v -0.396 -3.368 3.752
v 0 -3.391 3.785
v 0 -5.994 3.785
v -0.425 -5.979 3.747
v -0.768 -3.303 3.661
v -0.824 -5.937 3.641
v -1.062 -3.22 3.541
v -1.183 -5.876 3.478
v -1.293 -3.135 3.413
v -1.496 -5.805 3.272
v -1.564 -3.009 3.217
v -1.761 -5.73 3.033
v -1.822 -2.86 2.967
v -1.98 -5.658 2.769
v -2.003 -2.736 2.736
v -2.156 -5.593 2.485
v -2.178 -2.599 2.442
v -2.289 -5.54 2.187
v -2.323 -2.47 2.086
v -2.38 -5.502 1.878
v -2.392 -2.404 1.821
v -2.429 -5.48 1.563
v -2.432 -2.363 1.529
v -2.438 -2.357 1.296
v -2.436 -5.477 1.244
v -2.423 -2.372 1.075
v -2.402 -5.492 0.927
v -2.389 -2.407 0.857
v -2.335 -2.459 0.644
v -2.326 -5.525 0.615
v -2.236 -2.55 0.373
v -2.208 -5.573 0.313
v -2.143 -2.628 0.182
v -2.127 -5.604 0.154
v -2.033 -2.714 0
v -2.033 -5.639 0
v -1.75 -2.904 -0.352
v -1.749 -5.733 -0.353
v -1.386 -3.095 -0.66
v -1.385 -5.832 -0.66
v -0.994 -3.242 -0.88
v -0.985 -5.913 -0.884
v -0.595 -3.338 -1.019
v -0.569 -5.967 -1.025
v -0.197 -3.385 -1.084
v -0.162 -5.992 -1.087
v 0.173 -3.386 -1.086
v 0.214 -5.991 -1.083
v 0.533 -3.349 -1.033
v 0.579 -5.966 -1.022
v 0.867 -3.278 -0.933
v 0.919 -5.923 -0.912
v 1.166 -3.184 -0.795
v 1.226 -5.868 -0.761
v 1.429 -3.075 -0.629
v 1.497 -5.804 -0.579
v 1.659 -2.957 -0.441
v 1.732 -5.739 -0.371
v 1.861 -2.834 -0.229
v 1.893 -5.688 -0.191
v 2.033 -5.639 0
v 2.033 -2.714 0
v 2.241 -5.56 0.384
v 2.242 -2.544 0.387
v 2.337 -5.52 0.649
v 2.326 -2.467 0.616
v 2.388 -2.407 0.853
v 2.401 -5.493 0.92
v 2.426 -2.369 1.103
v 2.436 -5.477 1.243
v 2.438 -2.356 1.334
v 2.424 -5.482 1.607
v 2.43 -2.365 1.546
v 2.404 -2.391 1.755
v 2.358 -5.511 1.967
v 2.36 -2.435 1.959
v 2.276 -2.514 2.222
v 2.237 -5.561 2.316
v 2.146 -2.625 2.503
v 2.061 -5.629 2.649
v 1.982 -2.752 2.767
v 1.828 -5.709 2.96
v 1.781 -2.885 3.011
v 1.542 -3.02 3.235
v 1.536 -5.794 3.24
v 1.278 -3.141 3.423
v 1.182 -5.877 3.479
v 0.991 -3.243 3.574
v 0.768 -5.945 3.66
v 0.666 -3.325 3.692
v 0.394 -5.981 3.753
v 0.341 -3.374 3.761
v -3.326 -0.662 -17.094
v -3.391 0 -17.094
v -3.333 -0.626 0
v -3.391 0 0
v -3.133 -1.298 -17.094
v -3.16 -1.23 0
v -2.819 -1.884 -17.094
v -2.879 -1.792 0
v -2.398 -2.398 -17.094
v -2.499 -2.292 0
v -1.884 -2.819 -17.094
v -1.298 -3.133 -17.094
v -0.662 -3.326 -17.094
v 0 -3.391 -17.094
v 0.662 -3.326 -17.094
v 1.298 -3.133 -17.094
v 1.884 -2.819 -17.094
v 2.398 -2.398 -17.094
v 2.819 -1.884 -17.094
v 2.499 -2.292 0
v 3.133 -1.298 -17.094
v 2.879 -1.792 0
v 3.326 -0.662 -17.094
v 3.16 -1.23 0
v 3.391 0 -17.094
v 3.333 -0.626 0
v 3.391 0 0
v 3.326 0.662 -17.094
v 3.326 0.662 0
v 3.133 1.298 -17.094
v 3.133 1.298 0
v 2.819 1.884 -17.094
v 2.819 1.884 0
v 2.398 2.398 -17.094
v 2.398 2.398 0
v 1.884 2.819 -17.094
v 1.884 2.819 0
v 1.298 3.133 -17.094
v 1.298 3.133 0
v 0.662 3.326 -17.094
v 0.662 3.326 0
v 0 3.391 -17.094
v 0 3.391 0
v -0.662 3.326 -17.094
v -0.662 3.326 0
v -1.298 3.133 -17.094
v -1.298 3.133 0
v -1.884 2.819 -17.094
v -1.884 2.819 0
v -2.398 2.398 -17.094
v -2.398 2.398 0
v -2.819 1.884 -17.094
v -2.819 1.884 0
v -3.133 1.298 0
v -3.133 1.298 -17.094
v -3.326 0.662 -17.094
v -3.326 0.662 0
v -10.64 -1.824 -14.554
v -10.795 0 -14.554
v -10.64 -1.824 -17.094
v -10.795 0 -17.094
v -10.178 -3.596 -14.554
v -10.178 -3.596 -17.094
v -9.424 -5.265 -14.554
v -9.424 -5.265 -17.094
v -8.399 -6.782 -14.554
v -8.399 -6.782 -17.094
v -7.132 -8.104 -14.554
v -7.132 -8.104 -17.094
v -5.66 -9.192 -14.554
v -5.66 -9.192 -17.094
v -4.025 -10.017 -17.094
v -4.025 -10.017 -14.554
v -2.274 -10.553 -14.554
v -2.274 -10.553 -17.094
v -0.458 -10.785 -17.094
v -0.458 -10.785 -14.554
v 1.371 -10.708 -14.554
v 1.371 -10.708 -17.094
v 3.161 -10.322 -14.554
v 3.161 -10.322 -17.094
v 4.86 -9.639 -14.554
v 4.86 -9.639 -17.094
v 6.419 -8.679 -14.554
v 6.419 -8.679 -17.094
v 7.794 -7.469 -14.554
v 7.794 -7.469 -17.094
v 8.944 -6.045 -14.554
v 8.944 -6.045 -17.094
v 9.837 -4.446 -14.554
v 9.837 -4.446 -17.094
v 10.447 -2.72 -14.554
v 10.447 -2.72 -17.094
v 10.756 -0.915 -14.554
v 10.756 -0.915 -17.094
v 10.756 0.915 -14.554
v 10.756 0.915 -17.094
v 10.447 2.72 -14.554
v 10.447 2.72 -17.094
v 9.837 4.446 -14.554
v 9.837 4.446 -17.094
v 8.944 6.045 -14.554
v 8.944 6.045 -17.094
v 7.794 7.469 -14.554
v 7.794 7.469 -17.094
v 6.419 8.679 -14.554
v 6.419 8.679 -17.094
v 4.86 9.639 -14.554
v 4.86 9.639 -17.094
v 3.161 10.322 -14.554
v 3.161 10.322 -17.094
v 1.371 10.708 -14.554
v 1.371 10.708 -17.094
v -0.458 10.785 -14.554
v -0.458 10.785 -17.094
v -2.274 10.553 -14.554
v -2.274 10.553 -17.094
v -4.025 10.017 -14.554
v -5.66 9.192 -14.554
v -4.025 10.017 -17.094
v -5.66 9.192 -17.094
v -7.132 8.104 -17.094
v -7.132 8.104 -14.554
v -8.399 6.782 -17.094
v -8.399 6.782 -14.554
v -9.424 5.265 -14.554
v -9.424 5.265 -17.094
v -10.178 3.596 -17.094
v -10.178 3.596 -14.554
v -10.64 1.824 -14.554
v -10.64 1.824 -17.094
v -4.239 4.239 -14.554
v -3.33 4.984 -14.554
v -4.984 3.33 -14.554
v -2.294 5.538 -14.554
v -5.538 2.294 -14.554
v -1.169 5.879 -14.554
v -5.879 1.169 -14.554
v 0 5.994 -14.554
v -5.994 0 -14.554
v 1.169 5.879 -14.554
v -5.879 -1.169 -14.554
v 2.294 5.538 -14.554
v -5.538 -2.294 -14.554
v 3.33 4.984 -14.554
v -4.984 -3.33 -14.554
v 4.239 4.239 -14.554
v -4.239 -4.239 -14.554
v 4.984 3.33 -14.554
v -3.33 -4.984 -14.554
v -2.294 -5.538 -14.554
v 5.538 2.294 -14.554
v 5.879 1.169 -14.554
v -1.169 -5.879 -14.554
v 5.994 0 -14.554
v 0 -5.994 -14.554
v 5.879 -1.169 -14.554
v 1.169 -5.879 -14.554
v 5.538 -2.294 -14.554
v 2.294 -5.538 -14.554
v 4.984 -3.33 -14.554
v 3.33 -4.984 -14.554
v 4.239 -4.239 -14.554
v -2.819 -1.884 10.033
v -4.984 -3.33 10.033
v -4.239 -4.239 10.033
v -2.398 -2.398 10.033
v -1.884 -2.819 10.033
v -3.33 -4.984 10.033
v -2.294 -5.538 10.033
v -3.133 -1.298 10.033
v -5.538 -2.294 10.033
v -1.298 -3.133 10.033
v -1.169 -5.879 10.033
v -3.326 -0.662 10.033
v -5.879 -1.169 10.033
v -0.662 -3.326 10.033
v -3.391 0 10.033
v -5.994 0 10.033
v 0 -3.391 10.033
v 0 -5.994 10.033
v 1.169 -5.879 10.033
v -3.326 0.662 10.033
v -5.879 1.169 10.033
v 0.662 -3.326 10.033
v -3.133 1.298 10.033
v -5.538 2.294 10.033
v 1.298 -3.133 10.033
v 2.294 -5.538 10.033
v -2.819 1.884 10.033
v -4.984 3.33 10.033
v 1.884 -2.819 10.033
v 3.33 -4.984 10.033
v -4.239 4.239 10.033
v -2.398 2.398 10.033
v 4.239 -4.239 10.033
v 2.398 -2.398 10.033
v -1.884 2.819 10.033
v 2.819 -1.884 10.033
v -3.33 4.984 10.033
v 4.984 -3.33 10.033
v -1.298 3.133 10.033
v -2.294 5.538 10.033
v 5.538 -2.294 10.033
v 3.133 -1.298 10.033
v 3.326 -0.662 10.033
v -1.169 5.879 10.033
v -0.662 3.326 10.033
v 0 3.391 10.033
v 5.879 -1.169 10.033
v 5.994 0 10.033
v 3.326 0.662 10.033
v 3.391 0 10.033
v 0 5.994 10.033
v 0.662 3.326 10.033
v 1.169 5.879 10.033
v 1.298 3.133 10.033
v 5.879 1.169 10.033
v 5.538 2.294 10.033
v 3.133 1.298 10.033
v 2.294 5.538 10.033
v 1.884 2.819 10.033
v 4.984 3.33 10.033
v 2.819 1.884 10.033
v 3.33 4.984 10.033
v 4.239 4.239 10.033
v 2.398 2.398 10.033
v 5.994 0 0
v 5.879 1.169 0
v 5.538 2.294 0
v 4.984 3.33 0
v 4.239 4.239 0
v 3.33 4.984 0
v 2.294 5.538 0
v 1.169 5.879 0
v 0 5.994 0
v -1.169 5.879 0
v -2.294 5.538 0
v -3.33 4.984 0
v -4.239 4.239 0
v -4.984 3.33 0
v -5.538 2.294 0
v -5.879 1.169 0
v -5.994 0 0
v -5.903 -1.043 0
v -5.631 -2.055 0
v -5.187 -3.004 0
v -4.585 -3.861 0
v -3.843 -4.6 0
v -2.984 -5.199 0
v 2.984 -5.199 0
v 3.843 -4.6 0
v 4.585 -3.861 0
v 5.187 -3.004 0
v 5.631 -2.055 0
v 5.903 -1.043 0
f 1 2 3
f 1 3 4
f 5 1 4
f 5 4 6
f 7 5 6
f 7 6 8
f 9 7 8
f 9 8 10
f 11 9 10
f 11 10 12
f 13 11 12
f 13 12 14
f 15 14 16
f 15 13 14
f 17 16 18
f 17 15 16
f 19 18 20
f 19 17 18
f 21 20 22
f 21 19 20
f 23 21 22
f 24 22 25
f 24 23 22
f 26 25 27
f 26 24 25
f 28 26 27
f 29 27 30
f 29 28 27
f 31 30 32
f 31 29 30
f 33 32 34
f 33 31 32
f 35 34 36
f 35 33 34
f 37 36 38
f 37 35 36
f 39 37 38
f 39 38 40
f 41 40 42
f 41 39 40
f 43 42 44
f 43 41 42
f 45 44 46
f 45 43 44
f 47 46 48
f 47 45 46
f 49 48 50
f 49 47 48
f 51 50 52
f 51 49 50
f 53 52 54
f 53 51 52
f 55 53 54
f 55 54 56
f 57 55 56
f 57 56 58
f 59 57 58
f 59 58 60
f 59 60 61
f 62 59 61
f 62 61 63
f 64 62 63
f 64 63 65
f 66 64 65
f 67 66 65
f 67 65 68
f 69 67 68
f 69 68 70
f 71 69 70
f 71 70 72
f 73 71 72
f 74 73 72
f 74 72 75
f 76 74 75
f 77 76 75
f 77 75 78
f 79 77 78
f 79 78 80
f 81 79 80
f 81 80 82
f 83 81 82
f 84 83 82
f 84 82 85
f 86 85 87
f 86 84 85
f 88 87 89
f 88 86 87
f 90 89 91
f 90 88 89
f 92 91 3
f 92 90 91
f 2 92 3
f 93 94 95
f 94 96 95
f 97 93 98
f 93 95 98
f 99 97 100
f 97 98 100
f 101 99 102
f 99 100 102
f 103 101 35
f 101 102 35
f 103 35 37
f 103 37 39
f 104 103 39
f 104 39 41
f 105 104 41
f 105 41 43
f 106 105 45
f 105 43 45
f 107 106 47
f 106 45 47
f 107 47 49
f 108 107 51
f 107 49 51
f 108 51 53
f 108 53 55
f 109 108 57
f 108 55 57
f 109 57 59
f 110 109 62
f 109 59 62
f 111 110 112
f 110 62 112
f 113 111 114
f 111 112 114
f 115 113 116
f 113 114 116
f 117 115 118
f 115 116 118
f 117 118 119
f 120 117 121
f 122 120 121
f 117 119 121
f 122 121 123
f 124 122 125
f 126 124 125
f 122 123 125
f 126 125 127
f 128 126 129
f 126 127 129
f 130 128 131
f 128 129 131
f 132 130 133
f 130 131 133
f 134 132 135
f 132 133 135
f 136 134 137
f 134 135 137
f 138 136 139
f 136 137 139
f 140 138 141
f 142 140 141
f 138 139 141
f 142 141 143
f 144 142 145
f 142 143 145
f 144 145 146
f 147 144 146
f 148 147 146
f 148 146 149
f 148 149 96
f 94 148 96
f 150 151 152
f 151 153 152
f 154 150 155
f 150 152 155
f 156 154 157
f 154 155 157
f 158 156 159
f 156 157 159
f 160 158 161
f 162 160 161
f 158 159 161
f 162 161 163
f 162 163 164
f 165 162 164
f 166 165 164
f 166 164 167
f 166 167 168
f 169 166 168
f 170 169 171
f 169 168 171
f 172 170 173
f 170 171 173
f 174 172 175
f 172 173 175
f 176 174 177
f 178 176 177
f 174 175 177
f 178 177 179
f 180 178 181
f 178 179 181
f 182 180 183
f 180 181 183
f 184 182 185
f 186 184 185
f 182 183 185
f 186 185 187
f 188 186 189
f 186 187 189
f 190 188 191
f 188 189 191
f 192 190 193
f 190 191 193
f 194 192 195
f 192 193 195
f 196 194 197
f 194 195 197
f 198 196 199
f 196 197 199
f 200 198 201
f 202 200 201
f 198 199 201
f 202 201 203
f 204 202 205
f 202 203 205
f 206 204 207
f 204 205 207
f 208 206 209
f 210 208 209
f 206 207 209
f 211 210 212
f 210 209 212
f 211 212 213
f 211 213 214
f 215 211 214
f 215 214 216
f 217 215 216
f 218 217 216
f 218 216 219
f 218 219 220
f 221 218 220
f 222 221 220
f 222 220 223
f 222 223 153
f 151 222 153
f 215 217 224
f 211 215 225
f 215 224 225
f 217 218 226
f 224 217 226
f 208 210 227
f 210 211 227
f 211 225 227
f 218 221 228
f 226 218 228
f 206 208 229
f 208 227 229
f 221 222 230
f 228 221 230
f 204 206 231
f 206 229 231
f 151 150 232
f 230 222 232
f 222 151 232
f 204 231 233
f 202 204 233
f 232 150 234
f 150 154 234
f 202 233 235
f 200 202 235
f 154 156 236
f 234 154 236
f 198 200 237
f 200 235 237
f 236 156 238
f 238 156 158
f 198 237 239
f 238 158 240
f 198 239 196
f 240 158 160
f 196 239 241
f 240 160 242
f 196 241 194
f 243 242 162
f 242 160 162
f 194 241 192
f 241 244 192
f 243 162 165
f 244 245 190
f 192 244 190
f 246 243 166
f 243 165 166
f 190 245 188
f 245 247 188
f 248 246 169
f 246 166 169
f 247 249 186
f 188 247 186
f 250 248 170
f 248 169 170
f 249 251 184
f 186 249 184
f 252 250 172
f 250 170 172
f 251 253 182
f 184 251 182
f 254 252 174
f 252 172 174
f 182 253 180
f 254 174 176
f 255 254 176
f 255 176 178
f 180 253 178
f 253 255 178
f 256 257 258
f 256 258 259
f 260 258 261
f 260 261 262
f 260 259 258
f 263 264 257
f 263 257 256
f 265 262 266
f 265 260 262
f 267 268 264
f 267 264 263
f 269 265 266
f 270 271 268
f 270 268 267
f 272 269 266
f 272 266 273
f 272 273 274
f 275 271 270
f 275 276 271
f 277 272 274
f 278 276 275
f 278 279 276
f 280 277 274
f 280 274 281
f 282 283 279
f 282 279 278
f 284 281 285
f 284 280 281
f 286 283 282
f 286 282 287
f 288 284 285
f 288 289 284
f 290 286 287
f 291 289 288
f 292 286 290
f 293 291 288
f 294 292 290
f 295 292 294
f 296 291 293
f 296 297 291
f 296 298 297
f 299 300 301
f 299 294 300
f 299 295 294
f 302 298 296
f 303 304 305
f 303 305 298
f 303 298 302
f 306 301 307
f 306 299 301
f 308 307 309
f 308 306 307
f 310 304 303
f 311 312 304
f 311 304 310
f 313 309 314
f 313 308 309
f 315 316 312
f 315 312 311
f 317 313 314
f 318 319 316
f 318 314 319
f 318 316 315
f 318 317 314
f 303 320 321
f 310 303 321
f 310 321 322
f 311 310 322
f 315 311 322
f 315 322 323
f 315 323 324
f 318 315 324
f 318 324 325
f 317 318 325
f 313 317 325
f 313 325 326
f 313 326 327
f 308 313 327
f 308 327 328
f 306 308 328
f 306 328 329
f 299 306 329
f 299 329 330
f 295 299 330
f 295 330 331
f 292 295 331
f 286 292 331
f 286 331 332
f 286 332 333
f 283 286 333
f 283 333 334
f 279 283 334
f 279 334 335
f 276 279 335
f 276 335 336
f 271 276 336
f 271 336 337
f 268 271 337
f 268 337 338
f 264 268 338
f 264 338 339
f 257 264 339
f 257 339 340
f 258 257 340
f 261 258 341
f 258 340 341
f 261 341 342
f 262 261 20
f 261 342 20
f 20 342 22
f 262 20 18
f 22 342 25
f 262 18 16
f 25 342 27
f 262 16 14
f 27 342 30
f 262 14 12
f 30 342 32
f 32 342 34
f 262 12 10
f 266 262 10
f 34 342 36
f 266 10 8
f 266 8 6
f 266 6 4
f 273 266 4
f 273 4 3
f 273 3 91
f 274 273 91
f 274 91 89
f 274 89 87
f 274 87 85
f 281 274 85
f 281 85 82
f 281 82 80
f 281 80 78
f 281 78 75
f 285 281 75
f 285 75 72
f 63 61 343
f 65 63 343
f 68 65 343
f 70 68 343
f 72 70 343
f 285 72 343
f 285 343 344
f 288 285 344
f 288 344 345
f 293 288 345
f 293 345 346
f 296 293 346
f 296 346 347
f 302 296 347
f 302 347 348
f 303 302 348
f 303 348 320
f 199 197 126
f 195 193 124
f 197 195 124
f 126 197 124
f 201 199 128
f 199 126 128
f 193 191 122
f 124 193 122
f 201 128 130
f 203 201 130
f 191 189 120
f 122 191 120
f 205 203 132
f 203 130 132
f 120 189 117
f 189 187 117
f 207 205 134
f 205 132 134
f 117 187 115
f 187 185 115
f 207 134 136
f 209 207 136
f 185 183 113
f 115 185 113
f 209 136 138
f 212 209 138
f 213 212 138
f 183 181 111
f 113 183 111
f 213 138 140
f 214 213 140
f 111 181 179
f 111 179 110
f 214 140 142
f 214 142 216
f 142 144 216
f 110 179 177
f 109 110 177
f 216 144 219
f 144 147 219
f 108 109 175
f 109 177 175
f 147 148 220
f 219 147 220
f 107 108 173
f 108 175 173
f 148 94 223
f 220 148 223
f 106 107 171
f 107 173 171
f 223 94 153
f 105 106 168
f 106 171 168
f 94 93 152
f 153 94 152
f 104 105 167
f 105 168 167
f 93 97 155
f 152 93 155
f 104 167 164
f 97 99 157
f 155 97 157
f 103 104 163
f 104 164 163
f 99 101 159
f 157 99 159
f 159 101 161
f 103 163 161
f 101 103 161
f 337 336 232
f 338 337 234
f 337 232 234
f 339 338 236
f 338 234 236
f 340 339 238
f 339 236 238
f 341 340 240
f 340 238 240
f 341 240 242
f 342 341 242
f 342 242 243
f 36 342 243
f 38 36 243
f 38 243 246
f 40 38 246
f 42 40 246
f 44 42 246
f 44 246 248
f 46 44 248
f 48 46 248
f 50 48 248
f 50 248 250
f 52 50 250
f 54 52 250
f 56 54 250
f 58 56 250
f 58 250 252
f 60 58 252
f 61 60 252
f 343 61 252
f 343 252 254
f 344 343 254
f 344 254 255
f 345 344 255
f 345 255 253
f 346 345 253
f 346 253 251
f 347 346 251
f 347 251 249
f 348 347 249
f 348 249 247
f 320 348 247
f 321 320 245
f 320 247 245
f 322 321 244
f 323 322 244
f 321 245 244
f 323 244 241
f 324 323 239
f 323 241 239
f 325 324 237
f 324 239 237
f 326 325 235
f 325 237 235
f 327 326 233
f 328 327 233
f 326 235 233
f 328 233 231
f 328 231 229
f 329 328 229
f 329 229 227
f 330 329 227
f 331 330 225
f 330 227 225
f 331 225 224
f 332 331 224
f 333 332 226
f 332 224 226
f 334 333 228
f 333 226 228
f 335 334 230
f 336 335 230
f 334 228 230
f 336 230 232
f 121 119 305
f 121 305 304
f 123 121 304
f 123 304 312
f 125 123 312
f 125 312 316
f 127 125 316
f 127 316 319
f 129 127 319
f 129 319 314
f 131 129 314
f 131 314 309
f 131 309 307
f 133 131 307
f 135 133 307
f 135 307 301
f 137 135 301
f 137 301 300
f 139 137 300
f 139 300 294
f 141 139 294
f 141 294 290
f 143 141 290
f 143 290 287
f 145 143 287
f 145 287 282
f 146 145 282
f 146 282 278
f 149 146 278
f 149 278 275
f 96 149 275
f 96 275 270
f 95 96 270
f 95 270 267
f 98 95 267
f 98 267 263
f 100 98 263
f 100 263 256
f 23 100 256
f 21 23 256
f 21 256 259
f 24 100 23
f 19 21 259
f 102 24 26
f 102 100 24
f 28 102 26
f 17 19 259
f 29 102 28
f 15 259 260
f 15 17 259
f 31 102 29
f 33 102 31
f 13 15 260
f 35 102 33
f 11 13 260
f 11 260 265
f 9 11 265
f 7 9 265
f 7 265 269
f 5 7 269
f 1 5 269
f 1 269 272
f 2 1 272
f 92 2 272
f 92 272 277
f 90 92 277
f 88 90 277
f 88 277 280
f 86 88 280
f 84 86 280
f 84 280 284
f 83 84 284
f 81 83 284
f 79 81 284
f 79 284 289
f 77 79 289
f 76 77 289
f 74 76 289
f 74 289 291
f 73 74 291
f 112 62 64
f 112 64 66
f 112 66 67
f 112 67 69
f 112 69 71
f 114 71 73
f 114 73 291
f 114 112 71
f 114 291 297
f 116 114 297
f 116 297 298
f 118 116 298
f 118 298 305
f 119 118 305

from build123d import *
from build123d.topology import SkipClean

# Parameters (mm, degrees)
SKETCH2_R           = 5.9944
SKETCH2_R_2         = 3.3909
BOSS_EXTRUDE1_DEPTH = 10.033
SKETCH3_R           = 2.4384
CUT_EXTRUDE1_DEPTH  = 23.918894468


with BuildPart() as part:
    # Sketch2 → Boss-Extrude1 (new body)
    with BuildSketch(Plane.XY):
        Circle(SKETCH2_R)
        Circle(SKETCH2_R_2, mode=Mode.SUBTRACT)
    extrude(amount=BOSS_EXTRUDE1_DEPTH)

    # Sketch6 → Revolve1 (revolve)
    with SkipClean():  # the faces are left unmerged after this step: merging them gives an invalid solid
        with BuildSketch(Plane(origin=(0, 0, 0), x_dir=(1, 0, 0), z_dir=(0, 1, 0))):
            Polygon((-5.9944, 0), (-5.9944, 14.5542), (-10.795, 14.5542), (-10.795, 17.0942), (-3.3909, 17.0942), (-3.3909, 0), align=None)
        revolve(axis=Axis((0, 0, 0), (0, 0, 1)))

    # Sketch3 → Cut-Extrude1 (cut, through all)
    with SkipClean():  # the faces are left unmerged after this step: merging them gives an invalid solid
        with BuildSketch(Plane.XZ):
            with Locations((0, 1.3462)):
                Circle(SKETCH3_R)
        extrude(amount=CUT_EXTRUDE1_DEPTH, mode=Mode.SUBTRACT)


solid = part.part
